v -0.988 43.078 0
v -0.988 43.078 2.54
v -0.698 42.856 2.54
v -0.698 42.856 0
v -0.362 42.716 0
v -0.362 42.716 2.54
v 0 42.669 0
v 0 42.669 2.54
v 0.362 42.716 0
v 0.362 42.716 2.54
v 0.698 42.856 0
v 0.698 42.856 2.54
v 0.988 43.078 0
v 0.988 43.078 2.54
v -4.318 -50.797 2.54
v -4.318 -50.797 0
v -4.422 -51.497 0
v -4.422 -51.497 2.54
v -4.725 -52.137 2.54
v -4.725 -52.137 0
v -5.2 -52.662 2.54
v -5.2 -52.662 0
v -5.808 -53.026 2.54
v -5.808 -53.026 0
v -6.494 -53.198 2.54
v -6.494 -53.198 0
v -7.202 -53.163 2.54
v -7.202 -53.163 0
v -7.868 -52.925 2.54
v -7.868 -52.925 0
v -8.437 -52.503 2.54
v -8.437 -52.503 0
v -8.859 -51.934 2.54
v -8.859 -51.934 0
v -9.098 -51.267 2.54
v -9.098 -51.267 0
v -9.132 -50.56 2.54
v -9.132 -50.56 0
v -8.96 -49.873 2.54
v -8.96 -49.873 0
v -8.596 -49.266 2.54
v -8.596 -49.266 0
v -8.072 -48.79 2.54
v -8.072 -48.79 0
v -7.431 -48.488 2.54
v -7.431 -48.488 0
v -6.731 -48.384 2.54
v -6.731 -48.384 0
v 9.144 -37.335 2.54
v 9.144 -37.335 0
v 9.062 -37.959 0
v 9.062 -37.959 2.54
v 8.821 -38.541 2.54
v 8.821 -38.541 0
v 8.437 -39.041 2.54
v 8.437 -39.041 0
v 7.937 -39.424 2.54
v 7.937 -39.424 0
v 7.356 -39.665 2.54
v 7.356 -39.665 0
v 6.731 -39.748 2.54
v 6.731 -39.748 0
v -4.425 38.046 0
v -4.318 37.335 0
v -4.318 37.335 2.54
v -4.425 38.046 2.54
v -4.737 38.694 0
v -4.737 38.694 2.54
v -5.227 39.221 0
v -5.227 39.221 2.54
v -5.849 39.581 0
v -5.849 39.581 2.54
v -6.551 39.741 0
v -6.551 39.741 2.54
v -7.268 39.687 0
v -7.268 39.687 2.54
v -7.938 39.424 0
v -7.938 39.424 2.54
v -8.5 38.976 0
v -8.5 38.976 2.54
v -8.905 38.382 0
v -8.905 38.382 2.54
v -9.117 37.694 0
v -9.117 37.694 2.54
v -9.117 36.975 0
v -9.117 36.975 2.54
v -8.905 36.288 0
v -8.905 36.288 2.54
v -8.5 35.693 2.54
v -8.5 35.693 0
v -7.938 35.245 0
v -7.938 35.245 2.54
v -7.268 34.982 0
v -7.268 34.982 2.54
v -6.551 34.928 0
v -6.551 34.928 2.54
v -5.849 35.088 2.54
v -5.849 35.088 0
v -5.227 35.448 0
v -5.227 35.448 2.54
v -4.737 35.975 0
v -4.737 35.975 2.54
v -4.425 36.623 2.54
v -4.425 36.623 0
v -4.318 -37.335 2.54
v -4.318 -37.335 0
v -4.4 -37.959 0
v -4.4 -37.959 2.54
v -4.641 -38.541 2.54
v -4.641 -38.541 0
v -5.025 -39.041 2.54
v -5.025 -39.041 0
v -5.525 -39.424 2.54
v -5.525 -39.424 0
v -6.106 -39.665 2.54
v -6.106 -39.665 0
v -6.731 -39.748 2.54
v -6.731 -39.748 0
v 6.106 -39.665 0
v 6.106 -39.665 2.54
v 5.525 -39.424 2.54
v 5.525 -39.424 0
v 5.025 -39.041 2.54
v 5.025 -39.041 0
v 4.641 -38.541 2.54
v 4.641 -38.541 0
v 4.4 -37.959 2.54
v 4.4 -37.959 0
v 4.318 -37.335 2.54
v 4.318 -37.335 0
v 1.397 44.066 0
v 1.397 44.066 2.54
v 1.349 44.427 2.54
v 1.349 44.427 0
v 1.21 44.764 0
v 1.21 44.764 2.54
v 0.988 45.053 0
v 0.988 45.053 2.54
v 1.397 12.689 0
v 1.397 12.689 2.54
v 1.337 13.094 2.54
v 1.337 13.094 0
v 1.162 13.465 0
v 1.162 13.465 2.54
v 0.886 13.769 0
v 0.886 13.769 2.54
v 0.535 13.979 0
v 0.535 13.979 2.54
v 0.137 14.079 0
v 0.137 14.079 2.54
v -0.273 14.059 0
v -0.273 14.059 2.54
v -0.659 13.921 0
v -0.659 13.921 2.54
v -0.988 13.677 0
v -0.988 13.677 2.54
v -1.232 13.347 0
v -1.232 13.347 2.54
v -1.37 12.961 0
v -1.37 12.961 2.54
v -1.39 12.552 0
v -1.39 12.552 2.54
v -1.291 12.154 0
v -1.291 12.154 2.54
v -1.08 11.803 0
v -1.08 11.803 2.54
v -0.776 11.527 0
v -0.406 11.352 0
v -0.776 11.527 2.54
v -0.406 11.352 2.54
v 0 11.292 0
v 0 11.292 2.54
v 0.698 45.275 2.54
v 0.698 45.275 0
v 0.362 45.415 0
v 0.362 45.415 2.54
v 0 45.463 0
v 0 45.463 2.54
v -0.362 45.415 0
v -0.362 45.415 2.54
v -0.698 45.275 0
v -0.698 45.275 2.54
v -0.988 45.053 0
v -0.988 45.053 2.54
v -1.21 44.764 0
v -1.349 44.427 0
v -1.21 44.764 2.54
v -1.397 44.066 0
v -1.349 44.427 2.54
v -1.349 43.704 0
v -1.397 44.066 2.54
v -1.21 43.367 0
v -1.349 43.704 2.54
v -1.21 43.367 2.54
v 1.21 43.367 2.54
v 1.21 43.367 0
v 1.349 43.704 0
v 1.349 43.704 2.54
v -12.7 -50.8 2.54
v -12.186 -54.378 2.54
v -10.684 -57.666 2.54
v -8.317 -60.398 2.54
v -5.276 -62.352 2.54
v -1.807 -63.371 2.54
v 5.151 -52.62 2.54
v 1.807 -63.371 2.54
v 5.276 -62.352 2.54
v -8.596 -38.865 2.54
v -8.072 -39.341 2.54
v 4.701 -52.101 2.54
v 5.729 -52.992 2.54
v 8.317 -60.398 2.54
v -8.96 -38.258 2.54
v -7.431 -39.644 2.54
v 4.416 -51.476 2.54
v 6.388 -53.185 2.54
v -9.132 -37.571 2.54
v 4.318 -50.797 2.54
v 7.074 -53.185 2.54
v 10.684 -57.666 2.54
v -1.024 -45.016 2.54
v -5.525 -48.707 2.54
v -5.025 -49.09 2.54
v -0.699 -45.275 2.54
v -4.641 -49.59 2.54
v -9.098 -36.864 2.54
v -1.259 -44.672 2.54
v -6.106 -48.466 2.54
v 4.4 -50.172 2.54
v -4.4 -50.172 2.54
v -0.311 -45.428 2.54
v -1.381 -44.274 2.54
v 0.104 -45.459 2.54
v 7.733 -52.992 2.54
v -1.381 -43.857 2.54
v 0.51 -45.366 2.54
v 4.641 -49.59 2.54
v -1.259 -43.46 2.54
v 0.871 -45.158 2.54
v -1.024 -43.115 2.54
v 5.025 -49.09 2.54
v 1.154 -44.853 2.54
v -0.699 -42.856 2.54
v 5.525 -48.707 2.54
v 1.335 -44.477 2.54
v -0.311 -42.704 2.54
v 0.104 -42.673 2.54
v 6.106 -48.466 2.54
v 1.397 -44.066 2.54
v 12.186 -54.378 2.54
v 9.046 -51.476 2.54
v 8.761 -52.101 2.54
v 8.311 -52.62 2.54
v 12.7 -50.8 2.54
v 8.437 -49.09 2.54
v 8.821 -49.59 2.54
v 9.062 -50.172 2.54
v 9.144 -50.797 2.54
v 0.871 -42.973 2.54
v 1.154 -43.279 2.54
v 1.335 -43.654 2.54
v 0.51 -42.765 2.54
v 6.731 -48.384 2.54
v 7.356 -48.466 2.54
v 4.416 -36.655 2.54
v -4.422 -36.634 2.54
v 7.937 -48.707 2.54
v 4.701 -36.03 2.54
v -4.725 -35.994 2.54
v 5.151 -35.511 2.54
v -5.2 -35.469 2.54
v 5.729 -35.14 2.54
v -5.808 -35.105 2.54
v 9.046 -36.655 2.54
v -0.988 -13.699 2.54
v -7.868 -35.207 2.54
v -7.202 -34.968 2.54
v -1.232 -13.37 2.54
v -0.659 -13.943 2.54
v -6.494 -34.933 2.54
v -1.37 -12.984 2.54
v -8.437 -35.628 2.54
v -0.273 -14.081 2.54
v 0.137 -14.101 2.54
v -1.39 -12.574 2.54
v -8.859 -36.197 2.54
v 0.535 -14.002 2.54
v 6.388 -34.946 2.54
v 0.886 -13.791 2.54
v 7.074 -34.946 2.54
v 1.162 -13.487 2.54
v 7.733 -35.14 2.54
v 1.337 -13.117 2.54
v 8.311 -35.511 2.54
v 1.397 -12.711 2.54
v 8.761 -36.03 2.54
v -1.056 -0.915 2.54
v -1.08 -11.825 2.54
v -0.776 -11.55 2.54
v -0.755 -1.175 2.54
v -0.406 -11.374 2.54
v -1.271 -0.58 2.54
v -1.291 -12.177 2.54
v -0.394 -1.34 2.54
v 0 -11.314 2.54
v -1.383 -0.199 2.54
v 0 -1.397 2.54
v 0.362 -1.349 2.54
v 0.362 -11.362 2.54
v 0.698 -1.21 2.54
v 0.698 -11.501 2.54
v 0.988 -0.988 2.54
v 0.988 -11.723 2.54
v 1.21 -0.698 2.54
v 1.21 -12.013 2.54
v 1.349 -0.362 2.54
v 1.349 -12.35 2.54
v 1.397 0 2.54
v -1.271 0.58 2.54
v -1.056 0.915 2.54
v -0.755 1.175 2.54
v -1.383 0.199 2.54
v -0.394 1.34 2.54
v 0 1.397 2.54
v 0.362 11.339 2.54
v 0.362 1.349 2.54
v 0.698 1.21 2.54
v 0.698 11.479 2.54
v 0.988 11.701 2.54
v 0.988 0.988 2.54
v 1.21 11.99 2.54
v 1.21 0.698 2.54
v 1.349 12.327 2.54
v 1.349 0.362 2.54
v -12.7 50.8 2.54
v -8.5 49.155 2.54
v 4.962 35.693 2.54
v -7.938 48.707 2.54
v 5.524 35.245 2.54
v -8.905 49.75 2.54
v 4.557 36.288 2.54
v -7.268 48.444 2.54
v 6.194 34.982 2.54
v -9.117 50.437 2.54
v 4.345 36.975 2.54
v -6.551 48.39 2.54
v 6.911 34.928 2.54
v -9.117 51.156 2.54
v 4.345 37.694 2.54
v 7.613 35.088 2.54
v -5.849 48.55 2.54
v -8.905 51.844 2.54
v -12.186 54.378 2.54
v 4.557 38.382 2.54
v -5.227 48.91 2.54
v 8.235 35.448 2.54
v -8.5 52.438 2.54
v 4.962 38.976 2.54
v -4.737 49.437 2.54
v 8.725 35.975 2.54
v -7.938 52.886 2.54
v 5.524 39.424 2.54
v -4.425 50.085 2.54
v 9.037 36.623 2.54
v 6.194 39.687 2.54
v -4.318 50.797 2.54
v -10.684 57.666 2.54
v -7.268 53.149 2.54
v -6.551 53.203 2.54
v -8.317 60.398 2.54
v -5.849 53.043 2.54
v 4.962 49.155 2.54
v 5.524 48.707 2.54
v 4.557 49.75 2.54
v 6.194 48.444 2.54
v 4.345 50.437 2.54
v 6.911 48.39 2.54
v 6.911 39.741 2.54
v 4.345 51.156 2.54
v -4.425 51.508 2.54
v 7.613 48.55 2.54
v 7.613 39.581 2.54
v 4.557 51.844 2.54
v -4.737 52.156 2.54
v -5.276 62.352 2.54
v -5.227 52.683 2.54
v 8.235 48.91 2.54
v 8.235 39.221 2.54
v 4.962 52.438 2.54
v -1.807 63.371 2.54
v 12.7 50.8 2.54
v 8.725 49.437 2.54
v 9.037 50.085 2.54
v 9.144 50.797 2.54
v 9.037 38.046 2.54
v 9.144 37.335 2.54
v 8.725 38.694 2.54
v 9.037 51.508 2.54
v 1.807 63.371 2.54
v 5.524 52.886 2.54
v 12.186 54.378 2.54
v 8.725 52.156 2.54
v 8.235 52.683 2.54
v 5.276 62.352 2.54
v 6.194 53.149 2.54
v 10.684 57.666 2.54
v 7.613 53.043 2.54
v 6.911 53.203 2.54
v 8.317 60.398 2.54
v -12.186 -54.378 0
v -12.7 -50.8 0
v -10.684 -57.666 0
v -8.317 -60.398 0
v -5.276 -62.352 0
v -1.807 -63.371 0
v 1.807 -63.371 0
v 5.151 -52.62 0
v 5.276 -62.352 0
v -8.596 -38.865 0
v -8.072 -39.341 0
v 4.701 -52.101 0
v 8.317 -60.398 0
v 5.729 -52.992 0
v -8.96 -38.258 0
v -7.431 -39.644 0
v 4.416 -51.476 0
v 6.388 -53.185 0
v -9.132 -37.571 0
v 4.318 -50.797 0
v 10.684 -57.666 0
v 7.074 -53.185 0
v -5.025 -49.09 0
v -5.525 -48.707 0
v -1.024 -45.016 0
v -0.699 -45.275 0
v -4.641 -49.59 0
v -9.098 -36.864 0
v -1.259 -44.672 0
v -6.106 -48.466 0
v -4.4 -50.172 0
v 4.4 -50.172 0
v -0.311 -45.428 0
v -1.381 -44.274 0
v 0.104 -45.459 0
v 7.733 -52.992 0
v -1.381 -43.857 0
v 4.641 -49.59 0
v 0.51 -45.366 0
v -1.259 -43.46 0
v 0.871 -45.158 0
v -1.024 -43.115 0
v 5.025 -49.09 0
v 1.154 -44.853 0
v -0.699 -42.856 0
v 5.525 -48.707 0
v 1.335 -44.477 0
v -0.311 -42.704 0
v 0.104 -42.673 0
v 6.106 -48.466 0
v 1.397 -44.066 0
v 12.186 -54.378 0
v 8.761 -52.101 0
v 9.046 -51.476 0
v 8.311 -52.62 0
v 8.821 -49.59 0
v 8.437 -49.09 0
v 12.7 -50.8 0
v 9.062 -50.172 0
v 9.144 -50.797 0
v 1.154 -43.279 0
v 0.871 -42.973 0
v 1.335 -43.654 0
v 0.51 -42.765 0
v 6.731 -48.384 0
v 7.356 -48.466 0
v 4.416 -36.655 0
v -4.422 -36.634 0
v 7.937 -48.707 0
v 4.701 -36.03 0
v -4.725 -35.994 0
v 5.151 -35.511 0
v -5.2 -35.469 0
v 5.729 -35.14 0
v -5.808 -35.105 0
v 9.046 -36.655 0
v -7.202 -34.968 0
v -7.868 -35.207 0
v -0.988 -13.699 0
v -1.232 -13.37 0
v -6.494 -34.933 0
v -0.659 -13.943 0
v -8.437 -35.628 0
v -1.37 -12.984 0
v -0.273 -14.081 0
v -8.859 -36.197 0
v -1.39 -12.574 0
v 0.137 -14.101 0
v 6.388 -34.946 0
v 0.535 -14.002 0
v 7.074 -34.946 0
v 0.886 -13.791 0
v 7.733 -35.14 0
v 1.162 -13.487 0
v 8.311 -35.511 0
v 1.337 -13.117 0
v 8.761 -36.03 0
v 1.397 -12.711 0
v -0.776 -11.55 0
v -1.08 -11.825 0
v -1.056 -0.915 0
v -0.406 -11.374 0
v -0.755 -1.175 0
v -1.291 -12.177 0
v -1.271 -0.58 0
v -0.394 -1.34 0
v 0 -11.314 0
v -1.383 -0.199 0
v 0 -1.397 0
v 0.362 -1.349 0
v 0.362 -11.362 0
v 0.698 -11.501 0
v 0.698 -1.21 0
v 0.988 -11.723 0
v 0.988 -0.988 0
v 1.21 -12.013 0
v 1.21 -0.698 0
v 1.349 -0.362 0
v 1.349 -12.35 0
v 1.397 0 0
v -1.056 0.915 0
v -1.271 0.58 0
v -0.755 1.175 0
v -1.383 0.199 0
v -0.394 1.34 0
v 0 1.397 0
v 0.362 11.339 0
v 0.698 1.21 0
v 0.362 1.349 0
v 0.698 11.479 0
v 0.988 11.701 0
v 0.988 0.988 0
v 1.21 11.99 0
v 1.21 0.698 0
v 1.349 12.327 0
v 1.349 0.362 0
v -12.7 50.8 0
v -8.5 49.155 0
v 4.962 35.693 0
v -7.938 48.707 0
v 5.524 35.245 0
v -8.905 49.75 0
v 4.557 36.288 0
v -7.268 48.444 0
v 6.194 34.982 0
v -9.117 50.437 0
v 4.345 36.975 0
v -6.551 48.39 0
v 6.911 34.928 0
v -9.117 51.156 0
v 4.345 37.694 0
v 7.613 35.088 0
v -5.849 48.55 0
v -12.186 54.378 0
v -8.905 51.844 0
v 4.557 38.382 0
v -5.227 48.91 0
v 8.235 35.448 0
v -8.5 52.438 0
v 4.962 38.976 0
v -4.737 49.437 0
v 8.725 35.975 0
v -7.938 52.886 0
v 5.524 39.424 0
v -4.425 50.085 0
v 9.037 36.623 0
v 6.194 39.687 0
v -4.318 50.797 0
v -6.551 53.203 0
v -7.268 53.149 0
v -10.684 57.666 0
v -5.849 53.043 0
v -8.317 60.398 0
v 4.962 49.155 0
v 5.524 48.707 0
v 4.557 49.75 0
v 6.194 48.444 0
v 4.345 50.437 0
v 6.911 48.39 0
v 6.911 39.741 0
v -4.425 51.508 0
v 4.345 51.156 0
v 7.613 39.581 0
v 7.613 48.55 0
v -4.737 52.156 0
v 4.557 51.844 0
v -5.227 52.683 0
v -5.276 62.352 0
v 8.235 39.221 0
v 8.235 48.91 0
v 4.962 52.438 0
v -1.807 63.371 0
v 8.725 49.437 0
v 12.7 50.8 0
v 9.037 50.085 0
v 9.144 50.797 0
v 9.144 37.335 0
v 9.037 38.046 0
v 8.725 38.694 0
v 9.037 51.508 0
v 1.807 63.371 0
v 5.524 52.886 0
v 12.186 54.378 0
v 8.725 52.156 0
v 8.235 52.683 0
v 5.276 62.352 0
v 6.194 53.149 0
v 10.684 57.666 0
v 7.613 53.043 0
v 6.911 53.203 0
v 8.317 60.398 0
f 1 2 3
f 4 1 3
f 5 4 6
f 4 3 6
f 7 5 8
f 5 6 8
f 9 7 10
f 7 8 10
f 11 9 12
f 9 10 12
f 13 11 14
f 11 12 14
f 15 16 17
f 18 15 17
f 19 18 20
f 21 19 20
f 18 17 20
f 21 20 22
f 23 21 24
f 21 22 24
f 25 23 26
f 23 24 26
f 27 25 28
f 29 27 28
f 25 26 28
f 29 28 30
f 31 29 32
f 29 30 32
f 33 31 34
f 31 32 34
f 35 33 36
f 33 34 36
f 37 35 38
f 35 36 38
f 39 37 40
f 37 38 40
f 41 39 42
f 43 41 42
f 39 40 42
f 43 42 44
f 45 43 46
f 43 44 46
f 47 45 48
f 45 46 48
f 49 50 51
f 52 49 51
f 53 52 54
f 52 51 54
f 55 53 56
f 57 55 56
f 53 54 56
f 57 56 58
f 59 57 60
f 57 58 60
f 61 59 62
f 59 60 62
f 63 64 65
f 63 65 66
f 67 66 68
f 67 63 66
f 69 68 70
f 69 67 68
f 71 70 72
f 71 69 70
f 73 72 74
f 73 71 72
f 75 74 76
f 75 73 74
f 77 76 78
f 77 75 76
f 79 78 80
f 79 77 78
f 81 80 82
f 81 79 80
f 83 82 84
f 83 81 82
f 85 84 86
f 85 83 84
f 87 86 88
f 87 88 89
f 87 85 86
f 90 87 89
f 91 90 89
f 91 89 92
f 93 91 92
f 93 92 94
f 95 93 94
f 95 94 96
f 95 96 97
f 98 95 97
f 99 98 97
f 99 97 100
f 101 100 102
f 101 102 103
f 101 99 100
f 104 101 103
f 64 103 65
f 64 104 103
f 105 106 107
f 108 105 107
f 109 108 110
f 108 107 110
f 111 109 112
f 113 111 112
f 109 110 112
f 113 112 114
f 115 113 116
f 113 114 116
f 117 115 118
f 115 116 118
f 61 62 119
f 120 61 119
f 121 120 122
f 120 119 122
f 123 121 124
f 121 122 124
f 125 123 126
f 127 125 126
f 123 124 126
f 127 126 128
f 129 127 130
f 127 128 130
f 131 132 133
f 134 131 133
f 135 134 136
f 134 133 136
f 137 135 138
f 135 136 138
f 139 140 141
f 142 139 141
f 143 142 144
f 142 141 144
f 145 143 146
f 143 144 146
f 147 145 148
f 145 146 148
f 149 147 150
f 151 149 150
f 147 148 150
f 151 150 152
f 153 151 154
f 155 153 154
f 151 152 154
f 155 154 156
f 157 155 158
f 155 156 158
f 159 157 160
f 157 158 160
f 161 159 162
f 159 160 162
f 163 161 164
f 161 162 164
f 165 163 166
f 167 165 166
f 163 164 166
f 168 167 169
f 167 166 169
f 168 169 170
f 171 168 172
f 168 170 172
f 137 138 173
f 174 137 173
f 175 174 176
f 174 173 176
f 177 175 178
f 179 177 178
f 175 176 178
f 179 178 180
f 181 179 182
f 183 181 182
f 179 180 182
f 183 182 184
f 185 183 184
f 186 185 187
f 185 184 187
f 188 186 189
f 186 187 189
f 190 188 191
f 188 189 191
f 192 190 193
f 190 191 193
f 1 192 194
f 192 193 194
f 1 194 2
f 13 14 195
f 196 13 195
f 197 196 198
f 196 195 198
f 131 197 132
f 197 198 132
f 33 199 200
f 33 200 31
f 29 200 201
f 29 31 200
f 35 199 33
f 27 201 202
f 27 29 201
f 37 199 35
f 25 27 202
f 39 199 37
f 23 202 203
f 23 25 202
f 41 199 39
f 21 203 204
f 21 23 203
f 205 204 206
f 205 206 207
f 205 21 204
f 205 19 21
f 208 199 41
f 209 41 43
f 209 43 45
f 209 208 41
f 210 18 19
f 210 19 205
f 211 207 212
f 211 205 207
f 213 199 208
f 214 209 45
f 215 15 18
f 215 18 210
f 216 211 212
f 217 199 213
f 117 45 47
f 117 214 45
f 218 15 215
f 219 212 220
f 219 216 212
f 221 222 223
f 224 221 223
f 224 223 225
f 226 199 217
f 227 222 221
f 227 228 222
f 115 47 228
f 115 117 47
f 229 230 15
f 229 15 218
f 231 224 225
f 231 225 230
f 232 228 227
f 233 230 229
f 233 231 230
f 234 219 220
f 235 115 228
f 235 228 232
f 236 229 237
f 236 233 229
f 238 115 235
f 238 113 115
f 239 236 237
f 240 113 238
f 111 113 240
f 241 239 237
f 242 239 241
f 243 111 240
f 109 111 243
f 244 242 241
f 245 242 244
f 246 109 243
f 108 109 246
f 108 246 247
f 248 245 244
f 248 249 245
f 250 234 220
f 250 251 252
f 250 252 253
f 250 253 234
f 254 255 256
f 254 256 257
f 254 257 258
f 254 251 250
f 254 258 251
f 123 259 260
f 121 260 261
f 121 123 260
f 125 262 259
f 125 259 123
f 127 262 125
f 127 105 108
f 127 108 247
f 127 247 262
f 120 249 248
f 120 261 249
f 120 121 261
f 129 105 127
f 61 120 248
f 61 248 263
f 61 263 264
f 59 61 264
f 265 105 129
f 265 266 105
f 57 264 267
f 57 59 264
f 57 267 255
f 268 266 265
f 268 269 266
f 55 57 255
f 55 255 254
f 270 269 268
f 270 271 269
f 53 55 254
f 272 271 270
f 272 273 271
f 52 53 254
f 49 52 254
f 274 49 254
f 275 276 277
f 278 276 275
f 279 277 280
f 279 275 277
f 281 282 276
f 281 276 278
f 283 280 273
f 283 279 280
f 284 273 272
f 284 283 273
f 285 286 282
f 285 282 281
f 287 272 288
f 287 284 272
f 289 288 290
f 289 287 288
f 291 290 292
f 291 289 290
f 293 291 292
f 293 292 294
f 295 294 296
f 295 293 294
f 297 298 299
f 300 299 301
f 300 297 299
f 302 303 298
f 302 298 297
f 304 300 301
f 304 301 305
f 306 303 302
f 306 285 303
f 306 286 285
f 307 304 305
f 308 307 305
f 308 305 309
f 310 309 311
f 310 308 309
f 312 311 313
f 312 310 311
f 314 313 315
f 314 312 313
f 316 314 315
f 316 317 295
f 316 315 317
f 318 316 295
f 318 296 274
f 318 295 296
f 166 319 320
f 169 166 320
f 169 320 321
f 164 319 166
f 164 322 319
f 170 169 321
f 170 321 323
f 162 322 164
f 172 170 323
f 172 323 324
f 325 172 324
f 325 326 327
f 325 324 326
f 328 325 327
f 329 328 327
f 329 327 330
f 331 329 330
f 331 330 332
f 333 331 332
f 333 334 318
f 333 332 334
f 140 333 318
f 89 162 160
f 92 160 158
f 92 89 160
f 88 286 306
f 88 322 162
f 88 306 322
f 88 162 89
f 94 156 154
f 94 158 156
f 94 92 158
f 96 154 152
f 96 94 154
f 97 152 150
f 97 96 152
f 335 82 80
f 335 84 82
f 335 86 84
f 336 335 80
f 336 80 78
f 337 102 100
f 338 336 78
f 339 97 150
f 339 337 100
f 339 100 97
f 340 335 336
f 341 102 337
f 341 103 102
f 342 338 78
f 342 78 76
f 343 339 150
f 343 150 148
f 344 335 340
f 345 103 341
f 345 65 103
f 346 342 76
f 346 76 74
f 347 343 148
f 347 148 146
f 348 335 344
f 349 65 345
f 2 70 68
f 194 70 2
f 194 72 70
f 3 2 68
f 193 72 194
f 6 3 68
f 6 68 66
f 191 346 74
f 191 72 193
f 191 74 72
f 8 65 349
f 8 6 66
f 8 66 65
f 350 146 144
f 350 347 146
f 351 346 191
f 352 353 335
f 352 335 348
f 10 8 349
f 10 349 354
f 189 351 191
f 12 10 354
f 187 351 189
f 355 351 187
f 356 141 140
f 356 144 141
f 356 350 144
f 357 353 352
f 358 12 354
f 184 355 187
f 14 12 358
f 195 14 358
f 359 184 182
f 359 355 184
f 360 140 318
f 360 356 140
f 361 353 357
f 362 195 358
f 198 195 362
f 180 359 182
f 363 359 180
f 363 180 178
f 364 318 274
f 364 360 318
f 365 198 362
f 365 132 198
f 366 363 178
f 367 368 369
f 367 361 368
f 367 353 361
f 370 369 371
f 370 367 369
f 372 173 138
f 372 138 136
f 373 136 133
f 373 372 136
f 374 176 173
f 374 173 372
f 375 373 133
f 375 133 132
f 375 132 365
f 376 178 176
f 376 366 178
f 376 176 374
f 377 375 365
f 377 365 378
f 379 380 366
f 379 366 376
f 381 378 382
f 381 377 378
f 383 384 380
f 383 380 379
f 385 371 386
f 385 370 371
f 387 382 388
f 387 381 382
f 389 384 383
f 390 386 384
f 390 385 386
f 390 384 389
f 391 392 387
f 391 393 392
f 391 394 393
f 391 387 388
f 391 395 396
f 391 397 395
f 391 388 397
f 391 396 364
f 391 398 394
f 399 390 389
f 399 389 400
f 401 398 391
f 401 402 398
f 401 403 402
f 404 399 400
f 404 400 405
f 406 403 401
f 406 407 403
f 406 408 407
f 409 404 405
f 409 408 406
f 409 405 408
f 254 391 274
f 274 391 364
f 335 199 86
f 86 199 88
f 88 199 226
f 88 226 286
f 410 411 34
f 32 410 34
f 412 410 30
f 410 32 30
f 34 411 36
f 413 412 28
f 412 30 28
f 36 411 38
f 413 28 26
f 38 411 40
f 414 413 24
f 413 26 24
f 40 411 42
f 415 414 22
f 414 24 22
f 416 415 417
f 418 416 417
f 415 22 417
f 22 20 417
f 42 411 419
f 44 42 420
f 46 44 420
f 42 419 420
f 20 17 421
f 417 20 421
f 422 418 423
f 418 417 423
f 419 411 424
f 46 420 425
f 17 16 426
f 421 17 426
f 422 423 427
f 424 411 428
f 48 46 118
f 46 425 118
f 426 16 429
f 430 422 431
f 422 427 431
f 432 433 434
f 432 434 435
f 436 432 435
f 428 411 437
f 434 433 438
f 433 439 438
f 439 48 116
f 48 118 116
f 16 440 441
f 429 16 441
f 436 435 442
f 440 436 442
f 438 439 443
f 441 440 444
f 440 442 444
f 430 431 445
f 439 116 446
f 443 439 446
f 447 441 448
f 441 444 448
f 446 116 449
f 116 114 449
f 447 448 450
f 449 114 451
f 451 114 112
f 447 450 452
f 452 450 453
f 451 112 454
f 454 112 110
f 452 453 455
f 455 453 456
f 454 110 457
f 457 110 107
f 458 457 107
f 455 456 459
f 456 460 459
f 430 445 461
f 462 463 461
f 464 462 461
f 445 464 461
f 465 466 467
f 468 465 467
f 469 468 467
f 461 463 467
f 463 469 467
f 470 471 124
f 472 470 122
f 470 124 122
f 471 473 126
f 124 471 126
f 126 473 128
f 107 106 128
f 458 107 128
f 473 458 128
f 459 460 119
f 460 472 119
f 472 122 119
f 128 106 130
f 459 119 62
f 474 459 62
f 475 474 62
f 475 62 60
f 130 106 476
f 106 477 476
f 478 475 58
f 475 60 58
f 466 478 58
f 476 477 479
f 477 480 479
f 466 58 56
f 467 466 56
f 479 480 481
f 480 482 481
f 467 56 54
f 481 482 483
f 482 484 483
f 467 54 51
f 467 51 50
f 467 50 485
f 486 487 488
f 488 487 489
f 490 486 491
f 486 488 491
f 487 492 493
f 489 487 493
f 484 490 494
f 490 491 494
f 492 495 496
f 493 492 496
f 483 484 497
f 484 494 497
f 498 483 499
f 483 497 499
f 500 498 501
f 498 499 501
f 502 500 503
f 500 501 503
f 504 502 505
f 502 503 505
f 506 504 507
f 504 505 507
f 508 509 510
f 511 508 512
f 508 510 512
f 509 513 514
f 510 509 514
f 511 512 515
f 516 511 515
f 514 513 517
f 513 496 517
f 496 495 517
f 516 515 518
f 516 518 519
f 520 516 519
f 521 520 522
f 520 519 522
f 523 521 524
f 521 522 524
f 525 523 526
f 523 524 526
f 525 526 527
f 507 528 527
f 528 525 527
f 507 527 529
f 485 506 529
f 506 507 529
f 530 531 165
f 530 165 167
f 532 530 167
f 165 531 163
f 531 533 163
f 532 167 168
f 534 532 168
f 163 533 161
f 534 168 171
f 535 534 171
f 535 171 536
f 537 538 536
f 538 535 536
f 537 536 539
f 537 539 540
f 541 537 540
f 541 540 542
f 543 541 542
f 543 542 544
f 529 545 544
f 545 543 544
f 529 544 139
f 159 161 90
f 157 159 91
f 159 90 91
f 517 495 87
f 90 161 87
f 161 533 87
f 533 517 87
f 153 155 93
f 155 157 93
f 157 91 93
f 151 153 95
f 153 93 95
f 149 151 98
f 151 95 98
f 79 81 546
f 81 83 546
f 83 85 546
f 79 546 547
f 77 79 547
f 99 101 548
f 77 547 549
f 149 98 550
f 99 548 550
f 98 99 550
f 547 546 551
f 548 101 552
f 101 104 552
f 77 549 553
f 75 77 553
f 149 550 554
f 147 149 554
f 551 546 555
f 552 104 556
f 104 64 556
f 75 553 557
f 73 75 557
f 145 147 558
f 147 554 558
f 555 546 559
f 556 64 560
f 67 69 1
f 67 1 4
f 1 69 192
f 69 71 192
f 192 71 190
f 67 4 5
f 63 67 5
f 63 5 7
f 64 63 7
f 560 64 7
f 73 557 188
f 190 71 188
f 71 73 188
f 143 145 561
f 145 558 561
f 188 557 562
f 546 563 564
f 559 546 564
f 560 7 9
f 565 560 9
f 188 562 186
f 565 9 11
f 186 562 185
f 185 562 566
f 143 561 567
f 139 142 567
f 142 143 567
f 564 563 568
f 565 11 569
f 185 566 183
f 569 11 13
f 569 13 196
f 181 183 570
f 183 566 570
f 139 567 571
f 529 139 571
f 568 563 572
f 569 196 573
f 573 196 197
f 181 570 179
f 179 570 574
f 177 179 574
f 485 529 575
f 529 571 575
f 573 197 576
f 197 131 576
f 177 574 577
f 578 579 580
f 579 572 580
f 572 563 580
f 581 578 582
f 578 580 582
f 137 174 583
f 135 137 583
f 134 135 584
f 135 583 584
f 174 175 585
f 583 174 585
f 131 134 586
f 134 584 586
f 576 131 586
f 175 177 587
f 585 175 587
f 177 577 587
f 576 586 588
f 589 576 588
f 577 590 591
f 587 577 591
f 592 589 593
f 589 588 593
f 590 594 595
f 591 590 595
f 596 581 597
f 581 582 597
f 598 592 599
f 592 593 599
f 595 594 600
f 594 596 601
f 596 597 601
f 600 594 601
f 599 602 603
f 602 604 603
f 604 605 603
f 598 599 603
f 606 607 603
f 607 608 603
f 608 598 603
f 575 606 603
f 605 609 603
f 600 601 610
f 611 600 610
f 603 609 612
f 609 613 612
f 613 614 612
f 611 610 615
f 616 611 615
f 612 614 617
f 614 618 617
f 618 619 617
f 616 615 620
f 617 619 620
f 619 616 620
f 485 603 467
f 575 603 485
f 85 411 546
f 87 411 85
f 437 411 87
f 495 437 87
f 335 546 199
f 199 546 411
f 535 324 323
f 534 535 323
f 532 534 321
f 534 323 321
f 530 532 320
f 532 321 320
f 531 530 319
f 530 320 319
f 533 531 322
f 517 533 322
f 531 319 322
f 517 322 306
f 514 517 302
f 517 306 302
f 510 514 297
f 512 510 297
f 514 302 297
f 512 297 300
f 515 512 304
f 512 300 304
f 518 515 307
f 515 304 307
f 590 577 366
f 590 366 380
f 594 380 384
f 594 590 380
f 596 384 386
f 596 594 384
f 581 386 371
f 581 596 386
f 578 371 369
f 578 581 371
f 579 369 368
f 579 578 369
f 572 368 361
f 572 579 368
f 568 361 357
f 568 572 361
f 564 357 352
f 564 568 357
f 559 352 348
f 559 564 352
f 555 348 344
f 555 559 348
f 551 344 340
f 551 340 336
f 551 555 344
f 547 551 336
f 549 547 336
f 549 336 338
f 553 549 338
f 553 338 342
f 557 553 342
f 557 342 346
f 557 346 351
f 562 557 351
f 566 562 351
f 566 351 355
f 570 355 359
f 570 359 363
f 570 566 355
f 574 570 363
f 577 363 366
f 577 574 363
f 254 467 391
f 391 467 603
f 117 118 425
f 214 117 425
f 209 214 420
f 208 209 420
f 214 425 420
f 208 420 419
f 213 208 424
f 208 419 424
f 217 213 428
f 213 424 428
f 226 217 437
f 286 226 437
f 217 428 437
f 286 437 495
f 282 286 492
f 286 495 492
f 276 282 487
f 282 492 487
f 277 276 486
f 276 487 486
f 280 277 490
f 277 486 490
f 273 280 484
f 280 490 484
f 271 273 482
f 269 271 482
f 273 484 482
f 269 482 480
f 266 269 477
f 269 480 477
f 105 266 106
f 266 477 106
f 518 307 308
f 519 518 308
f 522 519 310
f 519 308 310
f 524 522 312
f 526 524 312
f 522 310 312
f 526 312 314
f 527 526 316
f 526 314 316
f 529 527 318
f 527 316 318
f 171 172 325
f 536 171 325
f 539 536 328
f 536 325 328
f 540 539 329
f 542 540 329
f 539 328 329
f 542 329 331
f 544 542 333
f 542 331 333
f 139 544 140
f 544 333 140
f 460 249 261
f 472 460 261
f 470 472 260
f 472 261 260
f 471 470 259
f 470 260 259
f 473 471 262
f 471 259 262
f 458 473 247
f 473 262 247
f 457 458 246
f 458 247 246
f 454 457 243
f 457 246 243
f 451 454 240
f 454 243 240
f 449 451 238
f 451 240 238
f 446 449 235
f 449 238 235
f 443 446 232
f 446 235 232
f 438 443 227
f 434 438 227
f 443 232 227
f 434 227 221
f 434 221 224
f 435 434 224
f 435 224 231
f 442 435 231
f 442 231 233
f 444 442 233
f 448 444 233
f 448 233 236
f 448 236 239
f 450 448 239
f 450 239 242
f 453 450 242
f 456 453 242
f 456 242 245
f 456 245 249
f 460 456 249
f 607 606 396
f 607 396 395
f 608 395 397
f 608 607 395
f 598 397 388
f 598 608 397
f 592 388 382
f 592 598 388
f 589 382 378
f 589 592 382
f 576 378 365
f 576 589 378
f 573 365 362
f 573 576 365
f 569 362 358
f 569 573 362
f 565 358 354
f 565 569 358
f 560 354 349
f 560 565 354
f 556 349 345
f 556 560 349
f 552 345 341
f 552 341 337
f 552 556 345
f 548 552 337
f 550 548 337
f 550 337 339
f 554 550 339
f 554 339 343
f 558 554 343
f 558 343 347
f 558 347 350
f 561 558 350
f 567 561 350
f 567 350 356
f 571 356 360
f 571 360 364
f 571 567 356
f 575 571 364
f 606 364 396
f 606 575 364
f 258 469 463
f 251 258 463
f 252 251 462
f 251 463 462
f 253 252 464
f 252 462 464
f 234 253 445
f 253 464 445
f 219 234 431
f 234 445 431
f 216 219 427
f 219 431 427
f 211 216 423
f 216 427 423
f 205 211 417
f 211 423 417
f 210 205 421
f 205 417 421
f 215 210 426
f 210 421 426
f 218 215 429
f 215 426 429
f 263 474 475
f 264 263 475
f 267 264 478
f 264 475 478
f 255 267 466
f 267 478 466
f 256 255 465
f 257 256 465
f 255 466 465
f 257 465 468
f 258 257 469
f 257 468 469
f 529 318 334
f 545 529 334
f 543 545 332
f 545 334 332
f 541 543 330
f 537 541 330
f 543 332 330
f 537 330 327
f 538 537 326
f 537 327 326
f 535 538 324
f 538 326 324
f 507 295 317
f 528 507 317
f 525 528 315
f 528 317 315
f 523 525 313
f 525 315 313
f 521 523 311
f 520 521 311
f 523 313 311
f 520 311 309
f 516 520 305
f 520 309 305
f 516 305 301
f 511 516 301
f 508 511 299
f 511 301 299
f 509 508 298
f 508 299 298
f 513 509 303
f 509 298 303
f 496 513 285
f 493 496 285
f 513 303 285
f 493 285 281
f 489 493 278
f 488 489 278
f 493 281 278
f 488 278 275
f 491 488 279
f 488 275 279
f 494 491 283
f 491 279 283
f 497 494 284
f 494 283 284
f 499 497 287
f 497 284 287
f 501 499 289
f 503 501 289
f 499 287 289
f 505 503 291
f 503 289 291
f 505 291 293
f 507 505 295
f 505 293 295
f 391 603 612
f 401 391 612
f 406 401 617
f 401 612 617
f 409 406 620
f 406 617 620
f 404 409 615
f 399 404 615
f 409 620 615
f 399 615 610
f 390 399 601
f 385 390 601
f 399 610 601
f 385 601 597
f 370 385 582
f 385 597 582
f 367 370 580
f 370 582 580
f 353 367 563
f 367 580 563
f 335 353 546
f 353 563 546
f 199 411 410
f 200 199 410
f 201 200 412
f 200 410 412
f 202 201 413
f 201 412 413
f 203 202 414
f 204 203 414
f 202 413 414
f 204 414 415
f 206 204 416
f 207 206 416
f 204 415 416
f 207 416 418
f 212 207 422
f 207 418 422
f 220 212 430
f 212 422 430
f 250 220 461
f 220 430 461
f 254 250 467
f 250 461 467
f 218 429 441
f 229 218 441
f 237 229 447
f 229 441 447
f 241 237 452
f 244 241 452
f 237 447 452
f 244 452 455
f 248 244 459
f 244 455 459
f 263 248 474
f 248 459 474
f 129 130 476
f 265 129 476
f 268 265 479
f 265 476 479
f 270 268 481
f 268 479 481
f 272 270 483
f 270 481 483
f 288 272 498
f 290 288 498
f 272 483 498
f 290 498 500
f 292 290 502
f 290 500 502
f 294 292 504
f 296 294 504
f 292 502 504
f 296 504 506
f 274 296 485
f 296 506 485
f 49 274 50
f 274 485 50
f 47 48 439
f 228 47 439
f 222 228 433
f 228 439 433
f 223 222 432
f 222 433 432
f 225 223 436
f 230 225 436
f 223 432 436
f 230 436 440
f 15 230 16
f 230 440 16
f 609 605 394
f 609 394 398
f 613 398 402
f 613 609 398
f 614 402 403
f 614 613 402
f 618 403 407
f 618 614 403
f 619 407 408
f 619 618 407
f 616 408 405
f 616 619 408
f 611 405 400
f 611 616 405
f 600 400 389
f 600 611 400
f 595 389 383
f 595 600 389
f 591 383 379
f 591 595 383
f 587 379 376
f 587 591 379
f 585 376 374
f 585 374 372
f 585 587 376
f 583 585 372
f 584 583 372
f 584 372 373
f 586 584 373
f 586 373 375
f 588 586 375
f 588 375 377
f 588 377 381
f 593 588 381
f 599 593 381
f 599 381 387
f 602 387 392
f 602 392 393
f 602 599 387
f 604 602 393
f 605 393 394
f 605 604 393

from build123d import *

# Parameters (mm, degrees)
F0_R     = 2.413
F1_DEPTH = 2.54
F2_R     = 1.397
F3_DEPTH = 2.541


with BuildPart() as f1:
    # F0 (on Top) → F1 (new body)
    with BuildSketch(Plane.XY):
        with BuildLine():
            Line((12.7, -50.8), (12.7, 50.8))
            ThreePointArc((12.7, 50.8), (0, 63.5), (-12.7, 50.8))
            Line((-12.7, 50.8), (-12.7, -50.8))
            ThreePointArc((-12.7, -50.8), (0, -63.5), (12.7, -50.8))
        make_face()
        with BuildLine():
            Line((4.318, -50.7966617284), (-4.318, -50.7966617284))
            ThreePointArc((-4.318, -50.7966617284), (-8.437248663, -52.5029103914), (-6.731, -48.3836617284))
            Line((-6.731, -48.3836617284), (-6.731, -39.7476617284))
            ThreePointArc((-6.731, -39.7476617284), (-8.437248663, -35.6284130654), (-4.318, -37.3346617284))
            Line((-4.318, -37.3346617284), (4.318, -37.3346617284))
            ThreePointArc((4.318, -37.3346617284), (6.731, -34.9216617284), (9.144, -37.3346617284))
            ThreePointArc((9.144, -37.3346617284), (8.437248663, -39.0409103914), (6.731, -39.7476617284))
            Line((6.731, -39.7476617284), (6.731, -48.3836617284))
            ThreePointArc((6.731, -48.3836617284), (8.437248663, -49.0904130654), (9.144, -50.7966617284))
            ThreePointArc((9.144, -50.7966617284), (6.731, -53.2096617284), (4.318, -50.7966617284))
        make_face(mode=Mode.SUBTRACT)
        with Locations((-6.731, 37.3346617284)):
            Circle(F0_R, mode=Mode.SUBTRACT)
        with Locations((-6.731, 50.7966617284)):
            Circle(F0_R, mode=Mode.SUBTRACT)
        with Locations((6.731, 37.3346617284)):
            Circle(F0_R, mode=Mode.SUBTRACT)
        with Locations((6.731, 50.7966617284)):
            Circle(F0_R, mode=Mode.SUBTRACT)
        with BuildLine():
            ThreePointArc((-6.731, -48.3836617284), (-5.024751337, -49.0904130654), (-4.318, -50.7966617284))
            Line((-4.318, -50.7966617284), (4.318, -50.7966617284))
            ThreePointArc((4.318, -50.7966617284), (5.024751337, -49.0904130654), (6.731, -48.3836617284))
            Line((6.731, -48.3836617284), (6.731, -39.7476617284))
            ThreePointArc((6.731, -39.7476617284), (5.024751337, -39.0409103914), (4.318, -37.3346617284))
            Line((4.318, -37.3346617284), (-4.318, -37.3346617284))
            ThreePointArc((-4.318, -37.3346617284), (-5.024751337, -39.0409103914), (-6.731, -39.7476617284))
            Line((-6.731, -39.7476617284), (-6.731, -48.3836617284))
        make_face()
    extrude(amount=F1_DEPTH)

    # F2 (on face) → F3 (cut, through all)
    with BuildSketch(Plane.XY.offset(2.54)):
        with BuildLine():
            ThreePointArc((0, -1.397), (0.9878281733, -0.9878281733), (1.397, 0))
            ThreePointArc((1.397, 0), (0.9878281733, 0.9878281733), (0, 1.397))
            Line((0, 1.397), (0, -1.397))
        make_face()
        with BuildLine():
            ThreePointArc((1.397, -12.7112130487), (0.9878281733, -11.7233848754), (0, -11.3142130487))
            ThreePointArc((0, -11.3142130487), (-0.9878281733, -13.699041222), (1.397, -12.7112130487))
        make_face()
        with BuildLine():
            ThreePointArc((1.397, 12.6887869513), (-0.9878281733, 13.6766151246), (0, 11.2917869513))
            ThreePointArc((0, 11.2917869513), (0.9878281733, 11.700958778), (1.397, 12.6887869513))
        make_face()
        with BuildLine():
            Line((0, -1.397), (0, 1.397))
            ThreePointArc((0, 1.397), (-1.397, 0), (0, -1.397))
        make_face()
        with BuildLine():
            ThreePointArc((0.9878281733, 45.0534899017), (0, 45.4626617284), (-0.9878281733, 45.0534899017))
            Line((-0.9878281733, 45.0534899017), (0, 44.0656617284))
            Line((0, 44.0656617284), (0.9878281733, 45.0534899017))
        make_face()
        with BuildLine():
            Line((0, 44.0656617284), (-0.9878281733, 45.0534899017))
            ThreePointArc((-0.9878281733, 45.0534899017), (-1.397, 44.0656617284), (-0.9878281733, 43.0778335551))
            Line((-0.9878281733, 43.0778335551), (0, 44.0656617284))
        make_face()
        with BuildLine():
            Line((0.9878281733, 45.0534899017), (0, 44.0656617284))
            Line((0, 44.0656617284), (0.9878281733, 43.0778335551))
            ThreePointArc((0.9878281733, 43.0778335551), (1.2906597069, 43.5310529734), (1.397, 44.0656617284))
            ThreePointArc((1.397, 44.0656617284), (1.2906597069, 44.6002704834), (0.9878281733, 45.0534899017))
        make_face()
        with BuildLine():
            Line((0.9878281733, 43.0778335551), (0, 44.0656617284))
            Line((0, 44.0656617284), (-0.9878281733, 43.0778335551))
            ThreePointArc((-0.9878281733, 43.0778335551), (0, 42.6686617284), (0.9878281733, 43.0778335551))
        make_face()
        with Locations((0, -44.0656617284)):
            Circle(F2_R)
    extrude(amount=-F3_DEPTH, mode=Mode.SUBTRACT)


solid = f1.part
